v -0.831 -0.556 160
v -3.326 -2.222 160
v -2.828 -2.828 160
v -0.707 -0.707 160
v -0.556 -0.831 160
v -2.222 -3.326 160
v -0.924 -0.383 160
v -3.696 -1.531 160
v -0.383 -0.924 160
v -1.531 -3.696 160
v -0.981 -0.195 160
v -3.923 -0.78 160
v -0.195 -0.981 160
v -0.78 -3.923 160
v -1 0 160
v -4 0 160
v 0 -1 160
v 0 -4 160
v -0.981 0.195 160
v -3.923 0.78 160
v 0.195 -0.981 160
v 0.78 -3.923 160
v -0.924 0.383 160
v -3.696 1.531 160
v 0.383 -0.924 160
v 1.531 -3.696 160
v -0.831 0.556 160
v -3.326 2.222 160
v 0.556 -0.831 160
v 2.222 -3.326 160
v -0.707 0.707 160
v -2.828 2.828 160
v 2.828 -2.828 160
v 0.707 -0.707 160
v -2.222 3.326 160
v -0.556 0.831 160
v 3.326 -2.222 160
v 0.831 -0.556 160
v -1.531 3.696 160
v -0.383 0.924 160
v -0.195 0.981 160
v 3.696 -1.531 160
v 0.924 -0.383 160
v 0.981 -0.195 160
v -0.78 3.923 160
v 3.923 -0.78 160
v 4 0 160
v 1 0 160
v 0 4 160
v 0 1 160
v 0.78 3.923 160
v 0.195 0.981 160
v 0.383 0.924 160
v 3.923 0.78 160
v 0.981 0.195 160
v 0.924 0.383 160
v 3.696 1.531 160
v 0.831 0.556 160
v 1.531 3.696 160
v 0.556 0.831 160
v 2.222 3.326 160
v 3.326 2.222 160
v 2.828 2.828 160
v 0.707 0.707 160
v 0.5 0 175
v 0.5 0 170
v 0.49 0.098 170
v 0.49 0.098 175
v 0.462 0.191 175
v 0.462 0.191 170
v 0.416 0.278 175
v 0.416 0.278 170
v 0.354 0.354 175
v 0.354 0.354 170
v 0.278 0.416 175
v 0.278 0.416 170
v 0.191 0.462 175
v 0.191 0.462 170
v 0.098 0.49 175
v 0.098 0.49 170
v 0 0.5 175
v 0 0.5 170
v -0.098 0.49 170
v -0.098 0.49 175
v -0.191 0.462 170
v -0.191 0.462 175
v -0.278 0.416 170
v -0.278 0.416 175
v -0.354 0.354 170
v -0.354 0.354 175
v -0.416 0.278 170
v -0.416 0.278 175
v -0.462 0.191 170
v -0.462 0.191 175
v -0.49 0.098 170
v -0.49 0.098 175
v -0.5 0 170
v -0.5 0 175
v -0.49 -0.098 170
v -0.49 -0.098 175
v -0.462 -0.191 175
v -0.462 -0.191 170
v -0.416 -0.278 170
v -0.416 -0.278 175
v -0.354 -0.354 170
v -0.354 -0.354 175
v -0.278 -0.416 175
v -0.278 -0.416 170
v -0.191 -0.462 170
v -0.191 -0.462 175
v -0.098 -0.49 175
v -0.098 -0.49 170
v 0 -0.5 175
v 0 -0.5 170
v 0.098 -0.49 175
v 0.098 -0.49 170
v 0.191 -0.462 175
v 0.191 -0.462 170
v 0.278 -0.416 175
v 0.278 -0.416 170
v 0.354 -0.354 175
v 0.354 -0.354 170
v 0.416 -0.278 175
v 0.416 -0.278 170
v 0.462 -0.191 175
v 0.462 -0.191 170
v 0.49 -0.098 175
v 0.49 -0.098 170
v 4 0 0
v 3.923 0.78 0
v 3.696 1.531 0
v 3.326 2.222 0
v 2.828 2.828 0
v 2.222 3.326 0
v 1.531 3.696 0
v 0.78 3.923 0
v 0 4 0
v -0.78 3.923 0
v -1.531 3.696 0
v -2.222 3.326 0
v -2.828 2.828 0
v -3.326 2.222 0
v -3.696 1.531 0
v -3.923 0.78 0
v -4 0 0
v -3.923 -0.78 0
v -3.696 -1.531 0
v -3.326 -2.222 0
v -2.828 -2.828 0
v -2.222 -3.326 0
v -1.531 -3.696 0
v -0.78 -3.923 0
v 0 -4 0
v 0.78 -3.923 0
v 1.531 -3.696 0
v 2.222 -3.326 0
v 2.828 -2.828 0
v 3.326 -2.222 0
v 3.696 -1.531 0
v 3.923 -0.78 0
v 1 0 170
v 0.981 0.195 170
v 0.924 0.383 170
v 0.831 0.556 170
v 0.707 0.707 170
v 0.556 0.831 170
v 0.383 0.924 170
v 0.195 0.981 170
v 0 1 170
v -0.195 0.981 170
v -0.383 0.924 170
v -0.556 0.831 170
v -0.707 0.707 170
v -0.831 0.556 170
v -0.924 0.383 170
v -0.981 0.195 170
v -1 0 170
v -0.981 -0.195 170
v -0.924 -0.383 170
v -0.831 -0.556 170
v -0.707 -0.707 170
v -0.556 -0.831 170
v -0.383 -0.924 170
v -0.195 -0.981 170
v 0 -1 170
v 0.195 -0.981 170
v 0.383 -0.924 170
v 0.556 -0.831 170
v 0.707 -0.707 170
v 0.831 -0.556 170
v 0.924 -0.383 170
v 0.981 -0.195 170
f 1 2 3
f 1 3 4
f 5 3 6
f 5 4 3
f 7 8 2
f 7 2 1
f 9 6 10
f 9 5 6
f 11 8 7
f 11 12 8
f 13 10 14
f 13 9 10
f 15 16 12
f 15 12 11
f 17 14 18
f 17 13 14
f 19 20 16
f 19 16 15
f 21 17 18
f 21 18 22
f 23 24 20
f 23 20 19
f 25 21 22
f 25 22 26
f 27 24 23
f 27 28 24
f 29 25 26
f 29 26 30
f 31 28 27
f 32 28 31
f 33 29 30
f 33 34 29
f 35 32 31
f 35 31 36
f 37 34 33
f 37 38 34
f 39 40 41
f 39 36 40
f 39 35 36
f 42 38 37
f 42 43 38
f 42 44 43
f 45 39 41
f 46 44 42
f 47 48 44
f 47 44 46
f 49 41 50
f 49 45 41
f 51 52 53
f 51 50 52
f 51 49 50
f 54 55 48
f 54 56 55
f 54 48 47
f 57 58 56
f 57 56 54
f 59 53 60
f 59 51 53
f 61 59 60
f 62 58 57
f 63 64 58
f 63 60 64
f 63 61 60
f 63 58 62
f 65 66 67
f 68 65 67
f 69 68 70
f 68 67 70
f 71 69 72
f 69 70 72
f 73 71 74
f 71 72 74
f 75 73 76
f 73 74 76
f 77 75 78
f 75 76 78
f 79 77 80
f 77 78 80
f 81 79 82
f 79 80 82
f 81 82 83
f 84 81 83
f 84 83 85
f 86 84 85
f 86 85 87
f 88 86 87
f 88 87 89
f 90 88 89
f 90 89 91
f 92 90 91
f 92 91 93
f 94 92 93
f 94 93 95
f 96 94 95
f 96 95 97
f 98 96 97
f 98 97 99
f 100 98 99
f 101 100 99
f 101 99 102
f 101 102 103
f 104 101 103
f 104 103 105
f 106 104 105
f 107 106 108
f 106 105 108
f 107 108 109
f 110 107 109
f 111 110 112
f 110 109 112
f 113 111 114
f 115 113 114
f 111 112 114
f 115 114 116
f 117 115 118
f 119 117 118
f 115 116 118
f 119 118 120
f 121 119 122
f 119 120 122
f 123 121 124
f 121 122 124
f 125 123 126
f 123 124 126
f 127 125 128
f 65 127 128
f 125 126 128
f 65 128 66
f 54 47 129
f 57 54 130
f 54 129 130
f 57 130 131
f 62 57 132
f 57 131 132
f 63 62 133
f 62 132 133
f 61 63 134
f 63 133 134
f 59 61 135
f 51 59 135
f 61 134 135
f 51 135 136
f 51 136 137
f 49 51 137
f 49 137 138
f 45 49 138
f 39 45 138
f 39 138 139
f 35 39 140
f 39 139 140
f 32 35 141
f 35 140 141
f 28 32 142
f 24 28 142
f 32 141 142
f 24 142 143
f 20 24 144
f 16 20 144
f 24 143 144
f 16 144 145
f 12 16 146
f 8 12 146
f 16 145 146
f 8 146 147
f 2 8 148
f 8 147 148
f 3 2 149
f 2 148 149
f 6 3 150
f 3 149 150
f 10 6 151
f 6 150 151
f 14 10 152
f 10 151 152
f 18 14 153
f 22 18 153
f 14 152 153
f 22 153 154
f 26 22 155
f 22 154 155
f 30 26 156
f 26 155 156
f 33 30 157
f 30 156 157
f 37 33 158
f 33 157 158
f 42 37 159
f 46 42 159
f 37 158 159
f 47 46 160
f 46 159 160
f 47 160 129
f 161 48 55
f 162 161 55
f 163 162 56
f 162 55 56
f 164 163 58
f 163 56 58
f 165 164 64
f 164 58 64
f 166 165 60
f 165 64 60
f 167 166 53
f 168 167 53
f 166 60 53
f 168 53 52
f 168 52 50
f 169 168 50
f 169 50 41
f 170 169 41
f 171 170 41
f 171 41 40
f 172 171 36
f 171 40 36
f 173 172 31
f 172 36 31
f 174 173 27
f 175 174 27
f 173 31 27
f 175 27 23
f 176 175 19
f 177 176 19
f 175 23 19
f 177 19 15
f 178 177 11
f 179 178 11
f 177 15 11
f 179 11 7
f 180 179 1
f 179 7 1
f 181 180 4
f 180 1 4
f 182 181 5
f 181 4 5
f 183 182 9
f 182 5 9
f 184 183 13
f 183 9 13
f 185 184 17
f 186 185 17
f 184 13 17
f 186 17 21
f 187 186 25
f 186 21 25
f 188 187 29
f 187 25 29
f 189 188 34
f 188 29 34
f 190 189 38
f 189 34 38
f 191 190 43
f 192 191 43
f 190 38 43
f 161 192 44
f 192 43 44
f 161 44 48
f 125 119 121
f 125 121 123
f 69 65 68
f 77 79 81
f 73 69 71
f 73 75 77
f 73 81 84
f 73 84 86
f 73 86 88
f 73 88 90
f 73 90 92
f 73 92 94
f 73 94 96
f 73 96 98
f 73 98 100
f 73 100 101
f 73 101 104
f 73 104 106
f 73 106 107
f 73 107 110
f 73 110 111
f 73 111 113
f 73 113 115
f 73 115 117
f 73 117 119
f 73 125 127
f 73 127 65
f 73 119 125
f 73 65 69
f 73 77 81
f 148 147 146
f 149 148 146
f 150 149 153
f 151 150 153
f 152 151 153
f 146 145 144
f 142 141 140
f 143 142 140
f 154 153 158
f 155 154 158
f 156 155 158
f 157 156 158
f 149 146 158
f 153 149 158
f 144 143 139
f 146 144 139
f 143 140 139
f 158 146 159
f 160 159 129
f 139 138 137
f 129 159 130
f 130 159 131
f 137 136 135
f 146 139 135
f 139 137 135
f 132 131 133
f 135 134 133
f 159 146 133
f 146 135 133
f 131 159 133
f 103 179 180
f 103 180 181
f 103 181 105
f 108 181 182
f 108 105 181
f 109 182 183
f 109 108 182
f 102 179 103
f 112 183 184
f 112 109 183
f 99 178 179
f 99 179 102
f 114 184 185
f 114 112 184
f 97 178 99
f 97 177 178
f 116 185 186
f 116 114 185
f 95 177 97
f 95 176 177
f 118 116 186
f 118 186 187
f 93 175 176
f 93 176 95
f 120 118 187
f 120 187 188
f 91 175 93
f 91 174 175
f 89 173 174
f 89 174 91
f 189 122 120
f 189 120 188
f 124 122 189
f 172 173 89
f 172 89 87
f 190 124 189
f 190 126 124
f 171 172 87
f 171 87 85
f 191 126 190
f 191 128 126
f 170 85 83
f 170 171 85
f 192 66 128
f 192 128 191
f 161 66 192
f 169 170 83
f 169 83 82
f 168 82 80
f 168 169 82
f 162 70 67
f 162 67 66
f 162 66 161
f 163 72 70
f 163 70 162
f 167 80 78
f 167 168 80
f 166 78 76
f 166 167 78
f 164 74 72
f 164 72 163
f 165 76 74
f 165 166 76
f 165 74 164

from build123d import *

# Parameters (mm, degrees)
SKETCH1_R           = 4
BOSS_EXTRUDE1_DEPTH = 160
SKETCH2_R           = 1
BOSS_EXTRUDE2_DEPTH = 10
SKETCH2_3_R         = 0.5
BOSS_EXTRUDE3_DEPTH = 15


with BuildPart() as part:
    # Sketch1 → Boss-Extrude1 (new body)
    with BuildSketch(Plane.XY):
        Circle(SKETCH1_R)
    extrude(amount=BOSS_EXTRUDE1_DEPTH)

    # Sketch2 → Boss-Extrude2 (add)
    with BuildSketch(Plane.XY.offset(160)):
        Circle(SKETCH2_R)
    extrude(amount=BOSS_EXTRUDE2_DEPTH)

    # Sketch2<3> → Boss-Extrude3 (add)
    with BuildSketch(Plane.XY.offset(160)):
        Circle(SKETCH2_3_R)
    extrude(amount=BOSS_EXTRUDE3_DEPTH)


solid = part.part
